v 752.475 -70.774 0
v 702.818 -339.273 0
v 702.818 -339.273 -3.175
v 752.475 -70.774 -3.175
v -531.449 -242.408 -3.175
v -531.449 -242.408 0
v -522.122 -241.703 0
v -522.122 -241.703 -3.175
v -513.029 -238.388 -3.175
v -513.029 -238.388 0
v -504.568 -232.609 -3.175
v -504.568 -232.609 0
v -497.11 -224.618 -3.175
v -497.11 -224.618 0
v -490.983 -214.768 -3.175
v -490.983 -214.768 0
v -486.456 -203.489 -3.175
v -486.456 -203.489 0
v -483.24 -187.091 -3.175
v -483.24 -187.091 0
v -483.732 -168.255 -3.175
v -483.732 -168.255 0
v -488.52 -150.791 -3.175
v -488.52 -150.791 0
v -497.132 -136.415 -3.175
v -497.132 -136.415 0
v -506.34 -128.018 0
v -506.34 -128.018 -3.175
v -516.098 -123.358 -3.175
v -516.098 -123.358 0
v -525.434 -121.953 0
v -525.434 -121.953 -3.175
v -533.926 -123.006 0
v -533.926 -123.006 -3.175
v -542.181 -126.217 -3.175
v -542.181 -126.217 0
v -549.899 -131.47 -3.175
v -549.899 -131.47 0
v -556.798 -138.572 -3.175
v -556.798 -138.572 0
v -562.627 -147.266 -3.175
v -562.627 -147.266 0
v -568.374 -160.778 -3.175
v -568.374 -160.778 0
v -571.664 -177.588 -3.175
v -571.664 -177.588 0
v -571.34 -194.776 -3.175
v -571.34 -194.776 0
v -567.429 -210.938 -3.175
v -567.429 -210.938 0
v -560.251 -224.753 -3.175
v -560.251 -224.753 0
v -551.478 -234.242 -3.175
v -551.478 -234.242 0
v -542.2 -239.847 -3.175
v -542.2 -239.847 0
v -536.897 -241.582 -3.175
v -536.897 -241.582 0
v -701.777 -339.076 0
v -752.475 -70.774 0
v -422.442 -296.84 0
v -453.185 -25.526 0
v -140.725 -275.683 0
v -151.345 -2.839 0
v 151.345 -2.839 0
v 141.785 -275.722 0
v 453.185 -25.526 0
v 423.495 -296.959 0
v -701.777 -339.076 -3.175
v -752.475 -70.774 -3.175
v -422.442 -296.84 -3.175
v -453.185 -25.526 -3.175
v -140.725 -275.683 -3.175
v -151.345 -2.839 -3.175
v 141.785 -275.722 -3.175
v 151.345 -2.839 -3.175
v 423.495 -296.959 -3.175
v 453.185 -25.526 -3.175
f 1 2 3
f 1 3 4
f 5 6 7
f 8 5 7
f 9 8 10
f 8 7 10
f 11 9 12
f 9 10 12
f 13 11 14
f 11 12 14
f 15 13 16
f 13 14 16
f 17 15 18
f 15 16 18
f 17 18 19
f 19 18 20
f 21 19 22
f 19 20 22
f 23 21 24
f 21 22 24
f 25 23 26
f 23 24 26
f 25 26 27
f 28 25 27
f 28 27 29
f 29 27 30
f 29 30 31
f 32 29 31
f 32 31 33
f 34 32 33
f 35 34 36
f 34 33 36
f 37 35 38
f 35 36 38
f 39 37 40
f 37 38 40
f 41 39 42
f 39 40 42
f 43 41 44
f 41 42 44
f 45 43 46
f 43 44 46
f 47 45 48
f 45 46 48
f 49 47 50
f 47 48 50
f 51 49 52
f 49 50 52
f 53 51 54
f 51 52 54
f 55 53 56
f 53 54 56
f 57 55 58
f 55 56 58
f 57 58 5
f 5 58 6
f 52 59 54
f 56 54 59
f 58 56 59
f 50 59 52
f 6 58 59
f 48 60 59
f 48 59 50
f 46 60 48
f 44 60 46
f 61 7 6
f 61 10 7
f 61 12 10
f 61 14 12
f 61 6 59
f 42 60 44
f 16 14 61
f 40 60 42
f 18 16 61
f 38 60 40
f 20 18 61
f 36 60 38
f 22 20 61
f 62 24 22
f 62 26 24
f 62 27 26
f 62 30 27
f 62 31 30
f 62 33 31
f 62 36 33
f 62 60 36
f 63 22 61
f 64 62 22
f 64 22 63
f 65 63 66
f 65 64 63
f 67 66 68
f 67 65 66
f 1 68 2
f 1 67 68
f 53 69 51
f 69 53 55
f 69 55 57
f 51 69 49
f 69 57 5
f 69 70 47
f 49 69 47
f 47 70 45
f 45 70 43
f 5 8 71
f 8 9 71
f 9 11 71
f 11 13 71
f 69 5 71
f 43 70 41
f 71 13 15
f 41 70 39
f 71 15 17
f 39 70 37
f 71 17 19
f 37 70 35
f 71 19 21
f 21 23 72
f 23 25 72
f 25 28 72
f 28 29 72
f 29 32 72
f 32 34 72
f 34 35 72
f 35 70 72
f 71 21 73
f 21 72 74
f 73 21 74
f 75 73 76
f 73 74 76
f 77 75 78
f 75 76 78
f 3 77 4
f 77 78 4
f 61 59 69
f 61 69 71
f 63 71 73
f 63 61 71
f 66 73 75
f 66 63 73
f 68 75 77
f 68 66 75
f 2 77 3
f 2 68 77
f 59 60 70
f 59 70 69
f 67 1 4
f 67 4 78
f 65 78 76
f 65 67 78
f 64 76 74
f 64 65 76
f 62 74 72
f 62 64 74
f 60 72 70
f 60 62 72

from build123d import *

# Parameters (mm, degrees)
SKETCH1_RX         = 60.325
SKETCH1_RY         = 44.45
BASE_EXTRUDE_DEPTH = 3.175


with BuildPart() as part:
    # Sketch1 → Base-Extrude (new body)
    with BuildSketch(Plane.XY):
        with BuildLine():
            Line((-752.475, -70.773505599), (-701.7766, -339.075622164))
            ThreePointArc((-701.7766, -339.075622164), (0.530014677, -273.05003733), (702.818, -339.273481384))
            Line((702.818, -339.273481384), (752.475, -70.773505599))
            ThreePointArc((752.475, -70.773505599), (0, 0), (-752.475, -70.773505599))
        make_face()
        with Locations(Location((-527.440710052, -182.216417238), (0, 0, -93.81))):
            Ellipse(SKETCH1_RX, SKETCH1_RY, mode=Mode.SUBTRACT)
    extrude(amount=-BASE_EXTRUDE_DEPTH)


solid = part.part
